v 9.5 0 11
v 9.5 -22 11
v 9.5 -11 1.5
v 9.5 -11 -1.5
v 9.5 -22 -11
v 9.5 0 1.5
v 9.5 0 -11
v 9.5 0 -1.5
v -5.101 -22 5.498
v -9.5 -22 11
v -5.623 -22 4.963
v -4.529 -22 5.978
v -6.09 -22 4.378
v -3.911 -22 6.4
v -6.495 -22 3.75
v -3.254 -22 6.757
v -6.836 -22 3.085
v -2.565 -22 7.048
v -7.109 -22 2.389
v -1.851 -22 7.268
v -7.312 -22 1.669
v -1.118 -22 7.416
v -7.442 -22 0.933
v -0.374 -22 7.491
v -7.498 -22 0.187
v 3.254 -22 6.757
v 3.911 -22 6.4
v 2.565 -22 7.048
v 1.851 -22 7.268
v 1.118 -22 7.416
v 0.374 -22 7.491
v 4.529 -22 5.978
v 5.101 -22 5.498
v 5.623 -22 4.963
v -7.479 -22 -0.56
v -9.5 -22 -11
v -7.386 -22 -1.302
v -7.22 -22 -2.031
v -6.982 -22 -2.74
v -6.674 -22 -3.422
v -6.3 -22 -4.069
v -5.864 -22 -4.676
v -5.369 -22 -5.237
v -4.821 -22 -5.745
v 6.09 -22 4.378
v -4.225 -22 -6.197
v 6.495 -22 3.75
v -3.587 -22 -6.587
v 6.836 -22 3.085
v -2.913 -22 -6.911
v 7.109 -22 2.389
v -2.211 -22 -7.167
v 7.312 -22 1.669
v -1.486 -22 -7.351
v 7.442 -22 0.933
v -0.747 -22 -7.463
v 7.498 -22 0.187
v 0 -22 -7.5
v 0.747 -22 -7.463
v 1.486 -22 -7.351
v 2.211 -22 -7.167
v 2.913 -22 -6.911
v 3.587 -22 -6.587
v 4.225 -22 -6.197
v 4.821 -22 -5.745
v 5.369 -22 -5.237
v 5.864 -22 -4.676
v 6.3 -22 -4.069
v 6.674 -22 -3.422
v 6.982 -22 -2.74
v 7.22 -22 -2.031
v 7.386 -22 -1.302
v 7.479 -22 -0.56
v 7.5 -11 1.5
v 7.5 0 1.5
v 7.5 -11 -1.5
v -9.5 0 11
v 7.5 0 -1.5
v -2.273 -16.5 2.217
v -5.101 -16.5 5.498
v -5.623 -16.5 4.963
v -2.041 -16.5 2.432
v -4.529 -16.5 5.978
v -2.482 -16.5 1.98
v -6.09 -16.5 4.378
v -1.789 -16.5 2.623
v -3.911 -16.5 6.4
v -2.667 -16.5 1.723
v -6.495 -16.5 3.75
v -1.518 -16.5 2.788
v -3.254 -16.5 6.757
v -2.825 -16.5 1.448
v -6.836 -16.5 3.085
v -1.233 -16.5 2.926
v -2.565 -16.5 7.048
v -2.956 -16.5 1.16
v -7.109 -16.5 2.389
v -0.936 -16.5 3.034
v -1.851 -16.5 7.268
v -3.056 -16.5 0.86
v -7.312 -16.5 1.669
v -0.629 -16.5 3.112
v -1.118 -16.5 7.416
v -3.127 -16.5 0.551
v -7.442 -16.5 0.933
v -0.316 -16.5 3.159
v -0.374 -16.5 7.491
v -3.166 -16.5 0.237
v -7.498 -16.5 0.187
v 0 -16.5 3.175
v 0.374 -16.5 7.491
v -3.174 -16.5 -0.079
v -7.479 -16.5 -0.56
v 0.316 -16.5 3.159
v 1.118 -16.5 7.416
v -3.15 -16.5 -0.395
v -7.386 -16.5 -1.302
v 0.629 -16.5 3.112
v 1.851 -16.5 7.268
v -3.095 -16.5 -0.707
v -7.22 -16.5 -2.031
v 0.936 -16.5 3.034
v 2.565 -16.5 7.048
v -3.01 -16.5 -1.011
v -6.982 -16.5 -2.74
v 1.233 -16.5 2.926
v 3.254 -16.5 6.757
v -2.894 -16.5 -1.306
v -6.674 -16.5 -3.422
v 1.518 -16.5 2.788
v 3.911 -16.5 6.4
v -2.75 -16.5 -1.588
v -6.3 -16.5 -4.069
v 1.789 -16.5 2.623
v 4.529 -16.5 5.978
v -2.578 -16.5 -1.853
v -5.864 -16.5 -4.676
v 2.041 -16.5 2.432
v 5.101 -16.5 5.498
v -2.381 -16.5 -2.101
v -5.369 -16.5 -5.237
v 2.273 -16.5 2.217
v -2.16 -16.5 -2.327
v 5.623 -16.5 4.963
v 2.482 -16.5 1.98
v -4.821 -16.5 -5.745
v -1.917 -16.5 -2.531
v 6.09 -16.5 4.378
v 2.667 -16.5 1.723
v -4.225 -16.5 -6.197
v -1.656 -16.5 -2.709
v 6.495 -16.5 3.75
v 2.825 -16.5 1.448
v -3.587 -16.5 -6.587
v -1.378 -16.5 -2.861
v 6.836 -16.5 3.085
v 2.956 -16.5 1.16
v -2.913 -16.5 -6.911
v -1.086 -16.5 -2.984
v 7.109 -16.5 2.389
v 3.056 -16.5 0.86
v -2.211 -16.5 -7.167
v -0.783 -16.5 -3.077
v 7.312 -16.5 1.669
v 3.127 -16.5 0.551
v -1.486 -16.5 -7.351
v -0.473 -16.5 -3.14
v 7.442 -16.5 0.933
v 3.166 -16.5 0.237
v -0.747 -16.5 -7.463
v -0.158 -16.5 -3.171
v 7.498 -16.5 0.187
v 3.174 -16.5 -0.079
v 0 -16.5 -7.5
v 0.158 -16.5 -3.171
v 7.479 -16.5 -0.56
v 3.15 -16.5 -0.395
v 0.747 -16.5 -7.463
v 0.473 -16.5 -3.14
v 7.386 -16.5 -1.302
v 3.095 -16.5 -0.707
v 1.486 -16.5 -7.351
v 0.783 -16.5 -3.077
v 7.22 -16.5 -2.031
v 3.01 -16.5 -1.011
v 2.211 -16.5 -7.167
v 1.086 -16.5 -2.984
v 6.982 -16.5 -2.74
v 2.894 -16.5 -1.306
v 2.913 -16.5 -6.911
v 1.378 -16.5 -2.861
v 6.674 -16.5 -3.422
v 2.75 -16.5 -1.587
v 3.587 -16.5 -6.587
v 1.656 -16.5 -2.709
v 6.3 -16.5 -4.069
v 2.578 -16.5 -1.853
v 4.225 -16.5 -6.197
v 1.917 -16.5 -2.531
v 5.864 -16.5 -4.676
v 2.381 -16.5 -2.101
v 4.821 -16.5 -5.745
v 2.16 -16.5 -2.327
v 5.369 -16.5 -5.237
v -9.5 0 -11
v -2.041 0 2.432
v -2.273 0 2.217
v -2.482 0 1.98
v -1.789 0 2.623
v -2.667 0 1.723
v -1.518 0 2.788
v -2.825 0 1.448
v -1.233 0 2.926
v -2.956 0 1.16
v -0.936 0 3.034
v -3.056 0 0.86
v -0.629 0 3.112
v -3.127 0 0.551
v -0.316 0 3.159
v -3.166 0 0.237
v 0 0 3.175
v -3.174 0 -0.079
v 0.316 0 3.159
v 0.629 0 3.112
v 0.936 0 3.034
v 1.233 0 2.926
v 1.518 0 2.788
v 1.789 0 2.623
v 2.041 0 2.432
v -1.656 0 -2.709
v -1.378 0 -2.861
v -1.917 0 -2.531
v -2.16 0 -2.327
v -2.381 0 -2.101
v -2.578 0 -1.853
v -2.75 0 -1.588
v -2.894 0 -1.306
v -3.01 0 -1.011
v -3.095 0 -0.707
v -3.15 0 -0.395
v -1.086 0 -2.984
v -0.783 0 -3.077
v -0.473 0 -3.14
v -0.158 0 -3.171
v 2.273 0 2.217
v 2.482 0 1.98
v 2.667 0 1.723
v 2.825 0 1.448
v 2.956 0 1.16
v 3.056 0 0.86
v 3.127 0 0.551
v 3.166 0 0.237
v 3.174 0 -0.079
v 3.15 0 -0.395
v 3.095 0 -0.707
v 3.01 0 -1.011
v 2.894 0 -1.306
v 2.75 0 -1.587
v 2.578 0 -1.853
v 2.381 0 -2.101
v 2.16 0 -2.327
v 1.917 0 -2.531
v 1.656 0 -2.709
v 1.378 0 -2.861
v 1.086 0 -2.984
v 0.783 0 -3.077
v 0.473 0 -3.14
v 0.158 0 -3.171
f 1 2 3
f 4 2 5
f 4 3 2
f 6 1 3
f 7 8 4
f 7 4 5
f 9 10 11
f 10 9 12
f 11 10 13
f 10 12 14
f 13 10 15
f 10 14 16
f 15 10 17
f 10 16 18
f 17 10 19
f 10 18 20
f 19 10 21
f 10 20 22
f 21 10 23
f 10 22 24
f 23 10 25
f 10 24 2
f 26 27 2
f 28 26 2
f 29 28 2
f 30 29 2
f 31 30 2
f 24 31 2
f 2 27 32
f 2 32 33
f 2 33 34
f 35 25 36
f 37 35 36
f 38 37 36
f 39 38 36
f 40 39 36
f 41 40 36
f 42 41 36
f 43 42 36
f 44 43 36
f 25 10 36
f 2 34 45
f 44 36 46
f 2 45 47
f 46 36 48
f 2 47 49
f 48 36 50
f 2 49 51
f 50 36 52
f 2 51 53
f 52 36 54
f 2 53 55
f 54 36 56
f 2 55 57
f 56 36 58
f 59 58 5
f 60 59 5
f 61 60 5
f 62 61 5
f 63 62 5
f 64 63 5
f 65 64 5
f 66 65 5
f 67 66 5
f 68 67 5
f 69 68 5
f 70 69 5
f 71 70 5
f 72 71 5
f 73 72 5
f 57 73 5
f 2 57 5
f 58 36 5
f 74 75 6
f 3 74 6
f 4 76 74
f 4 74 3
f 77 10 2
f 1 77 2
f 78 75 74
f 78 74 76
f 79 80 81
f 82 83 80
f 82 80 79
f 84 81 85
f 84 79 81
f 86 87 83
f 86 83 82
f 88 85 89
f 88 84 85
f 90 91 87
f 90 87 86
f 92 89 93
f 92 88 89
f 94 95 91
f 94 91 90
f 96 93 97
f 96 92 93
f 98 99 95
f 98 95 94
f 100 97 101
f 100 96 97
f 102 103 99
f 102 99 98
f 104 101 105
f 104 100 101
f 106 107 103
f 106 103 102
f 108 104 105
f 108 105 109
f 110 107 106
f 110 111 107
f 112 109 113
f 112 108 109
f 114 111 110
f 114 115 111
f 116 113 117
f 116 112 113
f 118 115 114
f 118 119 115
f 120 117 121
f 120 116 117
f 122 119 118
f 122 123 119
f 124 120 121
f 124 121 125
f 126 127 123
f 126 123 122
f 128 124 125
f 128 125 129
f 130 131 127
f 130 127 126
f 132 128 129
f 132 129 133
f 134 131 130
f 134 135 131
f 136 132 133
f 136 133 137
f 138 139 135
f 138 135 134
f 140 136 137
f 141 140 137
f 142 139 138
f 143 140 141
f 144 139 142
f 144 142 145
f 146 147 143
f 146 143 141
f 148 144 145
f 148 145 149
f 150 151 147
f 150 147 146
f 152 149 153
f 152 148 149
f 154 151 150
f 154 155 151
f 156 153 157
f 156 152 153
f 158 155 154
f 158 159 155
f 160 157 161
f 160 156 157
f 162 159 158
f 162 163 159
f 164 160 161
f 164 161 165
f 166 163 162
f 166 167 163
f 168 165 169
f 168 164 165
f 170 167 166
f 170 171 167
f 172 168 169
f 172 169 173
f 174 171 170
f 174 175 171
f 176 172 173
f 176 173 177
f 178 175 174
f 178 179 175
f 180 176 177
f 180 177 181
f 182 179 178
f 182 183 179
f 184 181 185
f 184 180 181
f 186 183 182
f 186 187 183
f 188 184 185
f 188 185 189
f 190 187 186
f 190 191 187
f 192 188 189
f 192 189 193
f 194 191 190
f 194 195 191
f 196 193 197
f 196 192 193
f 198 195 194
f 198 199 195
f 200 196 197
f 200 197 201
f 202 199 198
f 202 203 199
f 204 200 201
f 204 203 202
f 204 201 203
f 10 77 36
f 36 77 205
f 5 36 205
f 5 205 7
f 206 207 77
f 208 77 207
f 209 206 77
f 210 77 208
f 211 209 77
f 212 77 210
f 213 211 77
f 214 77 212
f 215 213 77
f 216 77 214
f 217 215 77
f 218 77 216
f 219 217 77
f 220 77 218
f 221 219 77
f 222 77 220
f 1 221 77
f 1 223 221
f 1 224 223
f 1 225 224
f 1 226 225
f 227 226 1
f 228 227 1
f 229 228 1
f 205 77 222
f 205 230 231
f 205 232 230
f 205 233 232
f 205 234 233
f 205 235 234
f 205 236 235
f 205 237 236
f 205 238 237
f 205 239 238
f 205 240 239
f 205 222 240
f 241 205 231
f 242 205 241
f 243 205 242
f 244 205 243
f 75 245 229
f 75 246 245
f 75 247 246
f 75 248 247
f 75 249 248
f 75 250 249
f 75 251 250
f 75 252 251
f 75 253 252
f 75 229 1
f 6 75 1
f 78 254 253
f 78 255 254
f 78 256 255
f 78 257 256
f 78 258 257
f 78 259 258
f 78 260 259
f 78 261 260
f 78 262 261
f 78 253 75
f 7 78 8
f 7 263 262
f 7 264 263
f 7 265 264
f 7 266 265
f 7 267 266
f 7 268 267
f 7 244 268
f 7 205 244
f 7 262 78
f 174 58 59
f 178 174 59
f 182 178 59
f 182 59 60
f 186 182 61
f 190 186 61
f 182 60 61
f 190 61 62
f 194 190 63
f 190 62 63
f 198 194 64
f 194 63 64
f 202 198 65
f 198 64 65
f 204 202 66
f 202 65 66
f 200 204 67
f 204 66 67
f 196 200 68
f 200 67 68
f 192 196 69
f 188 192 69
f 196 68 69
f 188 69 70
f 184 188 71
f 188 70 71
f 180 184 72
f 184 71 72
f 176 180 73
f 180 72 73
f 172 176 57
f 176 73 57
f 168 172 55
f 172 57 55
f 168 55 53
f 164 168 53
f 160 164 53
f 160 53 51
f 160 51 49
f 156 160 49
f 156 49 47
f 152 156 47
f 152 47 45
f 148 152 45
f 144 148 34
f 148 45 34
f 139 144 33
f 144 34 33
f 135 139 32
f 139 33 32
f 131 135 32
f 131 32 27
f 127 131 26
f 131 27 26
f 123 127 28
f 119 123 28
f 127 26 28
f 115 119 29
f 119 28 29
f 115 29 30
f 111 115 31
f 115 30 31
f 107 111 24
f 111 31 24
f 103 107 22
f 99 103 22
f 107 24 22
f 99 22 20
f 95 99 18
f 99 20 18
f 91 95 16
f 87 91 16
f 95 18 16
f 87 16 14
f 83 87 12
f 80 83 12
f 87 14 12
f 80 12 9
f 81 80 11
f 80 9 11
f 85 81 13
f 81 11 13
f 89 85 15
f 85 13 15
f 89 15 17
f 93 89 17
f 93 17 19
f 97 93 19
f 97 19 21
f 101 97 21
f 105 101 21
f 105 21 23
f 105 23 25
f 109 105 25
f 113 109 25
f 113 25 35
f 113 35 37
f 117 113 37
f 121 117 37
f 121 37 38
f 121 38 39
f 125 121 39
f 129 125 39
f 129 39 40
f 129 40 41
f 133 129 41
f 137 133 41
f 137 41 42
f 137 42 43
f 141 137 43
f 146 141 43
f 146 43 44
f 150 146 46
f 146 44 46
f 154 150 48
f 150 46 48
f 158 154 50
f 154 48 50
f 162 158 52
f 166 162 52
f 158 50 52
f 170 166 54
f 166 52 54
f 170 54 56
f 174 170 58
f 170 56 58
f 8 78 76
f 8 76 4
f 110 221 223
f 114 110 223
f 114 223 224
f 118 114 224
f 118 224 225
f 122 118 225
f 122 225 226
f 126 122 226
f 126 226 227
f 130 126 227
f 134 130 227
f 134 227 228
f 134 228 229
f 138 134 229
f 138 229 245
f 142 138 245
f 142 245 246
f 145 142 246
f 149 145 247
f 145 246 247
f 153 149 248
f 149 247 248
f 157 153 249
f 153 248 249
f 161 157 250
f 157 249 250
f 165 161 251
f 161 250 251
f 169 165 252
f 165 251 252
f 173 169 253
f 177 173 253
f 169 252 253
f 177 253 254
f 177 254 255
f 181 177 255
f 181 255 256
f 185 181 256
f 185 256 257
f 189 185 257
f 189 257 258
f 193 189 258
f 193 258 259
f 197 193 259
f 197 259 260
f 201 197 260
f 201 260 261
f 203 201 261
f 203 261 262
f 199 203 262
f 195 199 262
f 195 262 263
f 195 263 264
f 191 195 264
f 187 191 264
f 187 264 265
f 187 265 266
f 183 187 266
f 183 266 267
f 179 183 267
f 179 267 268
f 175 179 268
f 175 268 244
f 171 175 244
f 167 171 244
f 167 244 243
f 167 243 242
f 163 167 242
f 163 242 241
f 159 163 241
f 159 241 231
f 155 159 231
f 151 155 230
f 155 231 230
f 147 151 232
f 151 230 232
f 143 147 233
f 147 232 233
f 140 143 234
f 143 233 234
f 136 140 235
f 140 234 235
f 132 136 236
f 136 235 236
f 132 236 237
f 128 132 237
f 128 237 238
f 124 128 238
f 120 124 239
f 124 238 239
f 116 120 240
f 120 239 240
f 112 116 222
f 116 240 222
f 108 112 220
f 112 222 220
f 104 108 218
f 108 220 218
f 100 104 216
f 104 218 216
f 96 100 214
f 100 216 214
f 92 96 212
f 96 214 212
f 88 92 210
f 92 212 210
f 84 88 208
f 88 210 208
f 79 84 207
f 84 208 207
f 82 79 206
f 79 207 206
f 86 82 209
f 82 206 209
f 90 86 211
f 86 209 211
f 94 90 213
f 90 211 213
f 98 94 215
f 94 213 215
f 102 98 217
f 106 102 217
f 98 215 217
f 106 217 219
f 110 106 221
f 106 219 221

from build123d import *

# Parameters (mm, degrees)
SKETCH1_W           = 19
SKETCH1_H           = 22
BOSS_EXTRUDE1_DEPTH = 22
SKETCH2_R           = 3.175
CUT_EXTRUDE1_DEPTH  = 22
SKETCH3_R           = 7.5
CUT_EXTRUDE2_DEPTH  = 5.5
SKETCH4_W           = 2
SKETCH4_H           = 3
CUT_EXTRUDE5_DEPTH  = 11


with BuildPart() as part:
    # Sketch1 → Boss-Extrude1 (new body)
    with BuildSketch(Plane(origin=(0, 0, 0), x_dir=(1, 0, 0), z_dir=(0, 1, 0))):
        Rectangle(SKETCH1_W, SKETCH1_H)
    extrude(amount=-BOSS_EXTRUDE1_DEPTH)

    # Sketch2 → Cut-Extrude1 (cut)
    with BuildSketch(Plane(origin=(0, 0, 0), x_dir=(1, 0, 0), z_dir=(0, 1, 0))):
        with Locations(Location((0, 0, 0), (0, 0, 270))):
            Circle(SKETCH2_R)
    extrude(amount=-CUT_EXTRUDE1_DEPTH, mode=Mode.SUBTRACT)

    # Sketch3 → Cut-Extrude2 (cut)
    with BuildSketch(Plane.XZ.offset(22)):
        with Locations(Location((0, 0, 0), (0, 0, 270))):
            Circle(SKETCH3_R)
    extrude(amount=-CUT_EXTRUDE2_DEPTH, mode=Mode.SUBTRACT)

    # Sketch4 → Cut-Extrude5 (cut)
    with BuildSketch(Plane(origin=(0, 0, 0), x_dir=(1, 0, 0), z_dir=(0, 1, 0))):
        with Locations((8.5, 0)):
            Rectangle(SKETCH4_W, SKETCH4_H)
    extrude(amount=-CUT_EXTRUDE5_DEPTH, mode=Mode.SUBTRACT)


solid = part.part
